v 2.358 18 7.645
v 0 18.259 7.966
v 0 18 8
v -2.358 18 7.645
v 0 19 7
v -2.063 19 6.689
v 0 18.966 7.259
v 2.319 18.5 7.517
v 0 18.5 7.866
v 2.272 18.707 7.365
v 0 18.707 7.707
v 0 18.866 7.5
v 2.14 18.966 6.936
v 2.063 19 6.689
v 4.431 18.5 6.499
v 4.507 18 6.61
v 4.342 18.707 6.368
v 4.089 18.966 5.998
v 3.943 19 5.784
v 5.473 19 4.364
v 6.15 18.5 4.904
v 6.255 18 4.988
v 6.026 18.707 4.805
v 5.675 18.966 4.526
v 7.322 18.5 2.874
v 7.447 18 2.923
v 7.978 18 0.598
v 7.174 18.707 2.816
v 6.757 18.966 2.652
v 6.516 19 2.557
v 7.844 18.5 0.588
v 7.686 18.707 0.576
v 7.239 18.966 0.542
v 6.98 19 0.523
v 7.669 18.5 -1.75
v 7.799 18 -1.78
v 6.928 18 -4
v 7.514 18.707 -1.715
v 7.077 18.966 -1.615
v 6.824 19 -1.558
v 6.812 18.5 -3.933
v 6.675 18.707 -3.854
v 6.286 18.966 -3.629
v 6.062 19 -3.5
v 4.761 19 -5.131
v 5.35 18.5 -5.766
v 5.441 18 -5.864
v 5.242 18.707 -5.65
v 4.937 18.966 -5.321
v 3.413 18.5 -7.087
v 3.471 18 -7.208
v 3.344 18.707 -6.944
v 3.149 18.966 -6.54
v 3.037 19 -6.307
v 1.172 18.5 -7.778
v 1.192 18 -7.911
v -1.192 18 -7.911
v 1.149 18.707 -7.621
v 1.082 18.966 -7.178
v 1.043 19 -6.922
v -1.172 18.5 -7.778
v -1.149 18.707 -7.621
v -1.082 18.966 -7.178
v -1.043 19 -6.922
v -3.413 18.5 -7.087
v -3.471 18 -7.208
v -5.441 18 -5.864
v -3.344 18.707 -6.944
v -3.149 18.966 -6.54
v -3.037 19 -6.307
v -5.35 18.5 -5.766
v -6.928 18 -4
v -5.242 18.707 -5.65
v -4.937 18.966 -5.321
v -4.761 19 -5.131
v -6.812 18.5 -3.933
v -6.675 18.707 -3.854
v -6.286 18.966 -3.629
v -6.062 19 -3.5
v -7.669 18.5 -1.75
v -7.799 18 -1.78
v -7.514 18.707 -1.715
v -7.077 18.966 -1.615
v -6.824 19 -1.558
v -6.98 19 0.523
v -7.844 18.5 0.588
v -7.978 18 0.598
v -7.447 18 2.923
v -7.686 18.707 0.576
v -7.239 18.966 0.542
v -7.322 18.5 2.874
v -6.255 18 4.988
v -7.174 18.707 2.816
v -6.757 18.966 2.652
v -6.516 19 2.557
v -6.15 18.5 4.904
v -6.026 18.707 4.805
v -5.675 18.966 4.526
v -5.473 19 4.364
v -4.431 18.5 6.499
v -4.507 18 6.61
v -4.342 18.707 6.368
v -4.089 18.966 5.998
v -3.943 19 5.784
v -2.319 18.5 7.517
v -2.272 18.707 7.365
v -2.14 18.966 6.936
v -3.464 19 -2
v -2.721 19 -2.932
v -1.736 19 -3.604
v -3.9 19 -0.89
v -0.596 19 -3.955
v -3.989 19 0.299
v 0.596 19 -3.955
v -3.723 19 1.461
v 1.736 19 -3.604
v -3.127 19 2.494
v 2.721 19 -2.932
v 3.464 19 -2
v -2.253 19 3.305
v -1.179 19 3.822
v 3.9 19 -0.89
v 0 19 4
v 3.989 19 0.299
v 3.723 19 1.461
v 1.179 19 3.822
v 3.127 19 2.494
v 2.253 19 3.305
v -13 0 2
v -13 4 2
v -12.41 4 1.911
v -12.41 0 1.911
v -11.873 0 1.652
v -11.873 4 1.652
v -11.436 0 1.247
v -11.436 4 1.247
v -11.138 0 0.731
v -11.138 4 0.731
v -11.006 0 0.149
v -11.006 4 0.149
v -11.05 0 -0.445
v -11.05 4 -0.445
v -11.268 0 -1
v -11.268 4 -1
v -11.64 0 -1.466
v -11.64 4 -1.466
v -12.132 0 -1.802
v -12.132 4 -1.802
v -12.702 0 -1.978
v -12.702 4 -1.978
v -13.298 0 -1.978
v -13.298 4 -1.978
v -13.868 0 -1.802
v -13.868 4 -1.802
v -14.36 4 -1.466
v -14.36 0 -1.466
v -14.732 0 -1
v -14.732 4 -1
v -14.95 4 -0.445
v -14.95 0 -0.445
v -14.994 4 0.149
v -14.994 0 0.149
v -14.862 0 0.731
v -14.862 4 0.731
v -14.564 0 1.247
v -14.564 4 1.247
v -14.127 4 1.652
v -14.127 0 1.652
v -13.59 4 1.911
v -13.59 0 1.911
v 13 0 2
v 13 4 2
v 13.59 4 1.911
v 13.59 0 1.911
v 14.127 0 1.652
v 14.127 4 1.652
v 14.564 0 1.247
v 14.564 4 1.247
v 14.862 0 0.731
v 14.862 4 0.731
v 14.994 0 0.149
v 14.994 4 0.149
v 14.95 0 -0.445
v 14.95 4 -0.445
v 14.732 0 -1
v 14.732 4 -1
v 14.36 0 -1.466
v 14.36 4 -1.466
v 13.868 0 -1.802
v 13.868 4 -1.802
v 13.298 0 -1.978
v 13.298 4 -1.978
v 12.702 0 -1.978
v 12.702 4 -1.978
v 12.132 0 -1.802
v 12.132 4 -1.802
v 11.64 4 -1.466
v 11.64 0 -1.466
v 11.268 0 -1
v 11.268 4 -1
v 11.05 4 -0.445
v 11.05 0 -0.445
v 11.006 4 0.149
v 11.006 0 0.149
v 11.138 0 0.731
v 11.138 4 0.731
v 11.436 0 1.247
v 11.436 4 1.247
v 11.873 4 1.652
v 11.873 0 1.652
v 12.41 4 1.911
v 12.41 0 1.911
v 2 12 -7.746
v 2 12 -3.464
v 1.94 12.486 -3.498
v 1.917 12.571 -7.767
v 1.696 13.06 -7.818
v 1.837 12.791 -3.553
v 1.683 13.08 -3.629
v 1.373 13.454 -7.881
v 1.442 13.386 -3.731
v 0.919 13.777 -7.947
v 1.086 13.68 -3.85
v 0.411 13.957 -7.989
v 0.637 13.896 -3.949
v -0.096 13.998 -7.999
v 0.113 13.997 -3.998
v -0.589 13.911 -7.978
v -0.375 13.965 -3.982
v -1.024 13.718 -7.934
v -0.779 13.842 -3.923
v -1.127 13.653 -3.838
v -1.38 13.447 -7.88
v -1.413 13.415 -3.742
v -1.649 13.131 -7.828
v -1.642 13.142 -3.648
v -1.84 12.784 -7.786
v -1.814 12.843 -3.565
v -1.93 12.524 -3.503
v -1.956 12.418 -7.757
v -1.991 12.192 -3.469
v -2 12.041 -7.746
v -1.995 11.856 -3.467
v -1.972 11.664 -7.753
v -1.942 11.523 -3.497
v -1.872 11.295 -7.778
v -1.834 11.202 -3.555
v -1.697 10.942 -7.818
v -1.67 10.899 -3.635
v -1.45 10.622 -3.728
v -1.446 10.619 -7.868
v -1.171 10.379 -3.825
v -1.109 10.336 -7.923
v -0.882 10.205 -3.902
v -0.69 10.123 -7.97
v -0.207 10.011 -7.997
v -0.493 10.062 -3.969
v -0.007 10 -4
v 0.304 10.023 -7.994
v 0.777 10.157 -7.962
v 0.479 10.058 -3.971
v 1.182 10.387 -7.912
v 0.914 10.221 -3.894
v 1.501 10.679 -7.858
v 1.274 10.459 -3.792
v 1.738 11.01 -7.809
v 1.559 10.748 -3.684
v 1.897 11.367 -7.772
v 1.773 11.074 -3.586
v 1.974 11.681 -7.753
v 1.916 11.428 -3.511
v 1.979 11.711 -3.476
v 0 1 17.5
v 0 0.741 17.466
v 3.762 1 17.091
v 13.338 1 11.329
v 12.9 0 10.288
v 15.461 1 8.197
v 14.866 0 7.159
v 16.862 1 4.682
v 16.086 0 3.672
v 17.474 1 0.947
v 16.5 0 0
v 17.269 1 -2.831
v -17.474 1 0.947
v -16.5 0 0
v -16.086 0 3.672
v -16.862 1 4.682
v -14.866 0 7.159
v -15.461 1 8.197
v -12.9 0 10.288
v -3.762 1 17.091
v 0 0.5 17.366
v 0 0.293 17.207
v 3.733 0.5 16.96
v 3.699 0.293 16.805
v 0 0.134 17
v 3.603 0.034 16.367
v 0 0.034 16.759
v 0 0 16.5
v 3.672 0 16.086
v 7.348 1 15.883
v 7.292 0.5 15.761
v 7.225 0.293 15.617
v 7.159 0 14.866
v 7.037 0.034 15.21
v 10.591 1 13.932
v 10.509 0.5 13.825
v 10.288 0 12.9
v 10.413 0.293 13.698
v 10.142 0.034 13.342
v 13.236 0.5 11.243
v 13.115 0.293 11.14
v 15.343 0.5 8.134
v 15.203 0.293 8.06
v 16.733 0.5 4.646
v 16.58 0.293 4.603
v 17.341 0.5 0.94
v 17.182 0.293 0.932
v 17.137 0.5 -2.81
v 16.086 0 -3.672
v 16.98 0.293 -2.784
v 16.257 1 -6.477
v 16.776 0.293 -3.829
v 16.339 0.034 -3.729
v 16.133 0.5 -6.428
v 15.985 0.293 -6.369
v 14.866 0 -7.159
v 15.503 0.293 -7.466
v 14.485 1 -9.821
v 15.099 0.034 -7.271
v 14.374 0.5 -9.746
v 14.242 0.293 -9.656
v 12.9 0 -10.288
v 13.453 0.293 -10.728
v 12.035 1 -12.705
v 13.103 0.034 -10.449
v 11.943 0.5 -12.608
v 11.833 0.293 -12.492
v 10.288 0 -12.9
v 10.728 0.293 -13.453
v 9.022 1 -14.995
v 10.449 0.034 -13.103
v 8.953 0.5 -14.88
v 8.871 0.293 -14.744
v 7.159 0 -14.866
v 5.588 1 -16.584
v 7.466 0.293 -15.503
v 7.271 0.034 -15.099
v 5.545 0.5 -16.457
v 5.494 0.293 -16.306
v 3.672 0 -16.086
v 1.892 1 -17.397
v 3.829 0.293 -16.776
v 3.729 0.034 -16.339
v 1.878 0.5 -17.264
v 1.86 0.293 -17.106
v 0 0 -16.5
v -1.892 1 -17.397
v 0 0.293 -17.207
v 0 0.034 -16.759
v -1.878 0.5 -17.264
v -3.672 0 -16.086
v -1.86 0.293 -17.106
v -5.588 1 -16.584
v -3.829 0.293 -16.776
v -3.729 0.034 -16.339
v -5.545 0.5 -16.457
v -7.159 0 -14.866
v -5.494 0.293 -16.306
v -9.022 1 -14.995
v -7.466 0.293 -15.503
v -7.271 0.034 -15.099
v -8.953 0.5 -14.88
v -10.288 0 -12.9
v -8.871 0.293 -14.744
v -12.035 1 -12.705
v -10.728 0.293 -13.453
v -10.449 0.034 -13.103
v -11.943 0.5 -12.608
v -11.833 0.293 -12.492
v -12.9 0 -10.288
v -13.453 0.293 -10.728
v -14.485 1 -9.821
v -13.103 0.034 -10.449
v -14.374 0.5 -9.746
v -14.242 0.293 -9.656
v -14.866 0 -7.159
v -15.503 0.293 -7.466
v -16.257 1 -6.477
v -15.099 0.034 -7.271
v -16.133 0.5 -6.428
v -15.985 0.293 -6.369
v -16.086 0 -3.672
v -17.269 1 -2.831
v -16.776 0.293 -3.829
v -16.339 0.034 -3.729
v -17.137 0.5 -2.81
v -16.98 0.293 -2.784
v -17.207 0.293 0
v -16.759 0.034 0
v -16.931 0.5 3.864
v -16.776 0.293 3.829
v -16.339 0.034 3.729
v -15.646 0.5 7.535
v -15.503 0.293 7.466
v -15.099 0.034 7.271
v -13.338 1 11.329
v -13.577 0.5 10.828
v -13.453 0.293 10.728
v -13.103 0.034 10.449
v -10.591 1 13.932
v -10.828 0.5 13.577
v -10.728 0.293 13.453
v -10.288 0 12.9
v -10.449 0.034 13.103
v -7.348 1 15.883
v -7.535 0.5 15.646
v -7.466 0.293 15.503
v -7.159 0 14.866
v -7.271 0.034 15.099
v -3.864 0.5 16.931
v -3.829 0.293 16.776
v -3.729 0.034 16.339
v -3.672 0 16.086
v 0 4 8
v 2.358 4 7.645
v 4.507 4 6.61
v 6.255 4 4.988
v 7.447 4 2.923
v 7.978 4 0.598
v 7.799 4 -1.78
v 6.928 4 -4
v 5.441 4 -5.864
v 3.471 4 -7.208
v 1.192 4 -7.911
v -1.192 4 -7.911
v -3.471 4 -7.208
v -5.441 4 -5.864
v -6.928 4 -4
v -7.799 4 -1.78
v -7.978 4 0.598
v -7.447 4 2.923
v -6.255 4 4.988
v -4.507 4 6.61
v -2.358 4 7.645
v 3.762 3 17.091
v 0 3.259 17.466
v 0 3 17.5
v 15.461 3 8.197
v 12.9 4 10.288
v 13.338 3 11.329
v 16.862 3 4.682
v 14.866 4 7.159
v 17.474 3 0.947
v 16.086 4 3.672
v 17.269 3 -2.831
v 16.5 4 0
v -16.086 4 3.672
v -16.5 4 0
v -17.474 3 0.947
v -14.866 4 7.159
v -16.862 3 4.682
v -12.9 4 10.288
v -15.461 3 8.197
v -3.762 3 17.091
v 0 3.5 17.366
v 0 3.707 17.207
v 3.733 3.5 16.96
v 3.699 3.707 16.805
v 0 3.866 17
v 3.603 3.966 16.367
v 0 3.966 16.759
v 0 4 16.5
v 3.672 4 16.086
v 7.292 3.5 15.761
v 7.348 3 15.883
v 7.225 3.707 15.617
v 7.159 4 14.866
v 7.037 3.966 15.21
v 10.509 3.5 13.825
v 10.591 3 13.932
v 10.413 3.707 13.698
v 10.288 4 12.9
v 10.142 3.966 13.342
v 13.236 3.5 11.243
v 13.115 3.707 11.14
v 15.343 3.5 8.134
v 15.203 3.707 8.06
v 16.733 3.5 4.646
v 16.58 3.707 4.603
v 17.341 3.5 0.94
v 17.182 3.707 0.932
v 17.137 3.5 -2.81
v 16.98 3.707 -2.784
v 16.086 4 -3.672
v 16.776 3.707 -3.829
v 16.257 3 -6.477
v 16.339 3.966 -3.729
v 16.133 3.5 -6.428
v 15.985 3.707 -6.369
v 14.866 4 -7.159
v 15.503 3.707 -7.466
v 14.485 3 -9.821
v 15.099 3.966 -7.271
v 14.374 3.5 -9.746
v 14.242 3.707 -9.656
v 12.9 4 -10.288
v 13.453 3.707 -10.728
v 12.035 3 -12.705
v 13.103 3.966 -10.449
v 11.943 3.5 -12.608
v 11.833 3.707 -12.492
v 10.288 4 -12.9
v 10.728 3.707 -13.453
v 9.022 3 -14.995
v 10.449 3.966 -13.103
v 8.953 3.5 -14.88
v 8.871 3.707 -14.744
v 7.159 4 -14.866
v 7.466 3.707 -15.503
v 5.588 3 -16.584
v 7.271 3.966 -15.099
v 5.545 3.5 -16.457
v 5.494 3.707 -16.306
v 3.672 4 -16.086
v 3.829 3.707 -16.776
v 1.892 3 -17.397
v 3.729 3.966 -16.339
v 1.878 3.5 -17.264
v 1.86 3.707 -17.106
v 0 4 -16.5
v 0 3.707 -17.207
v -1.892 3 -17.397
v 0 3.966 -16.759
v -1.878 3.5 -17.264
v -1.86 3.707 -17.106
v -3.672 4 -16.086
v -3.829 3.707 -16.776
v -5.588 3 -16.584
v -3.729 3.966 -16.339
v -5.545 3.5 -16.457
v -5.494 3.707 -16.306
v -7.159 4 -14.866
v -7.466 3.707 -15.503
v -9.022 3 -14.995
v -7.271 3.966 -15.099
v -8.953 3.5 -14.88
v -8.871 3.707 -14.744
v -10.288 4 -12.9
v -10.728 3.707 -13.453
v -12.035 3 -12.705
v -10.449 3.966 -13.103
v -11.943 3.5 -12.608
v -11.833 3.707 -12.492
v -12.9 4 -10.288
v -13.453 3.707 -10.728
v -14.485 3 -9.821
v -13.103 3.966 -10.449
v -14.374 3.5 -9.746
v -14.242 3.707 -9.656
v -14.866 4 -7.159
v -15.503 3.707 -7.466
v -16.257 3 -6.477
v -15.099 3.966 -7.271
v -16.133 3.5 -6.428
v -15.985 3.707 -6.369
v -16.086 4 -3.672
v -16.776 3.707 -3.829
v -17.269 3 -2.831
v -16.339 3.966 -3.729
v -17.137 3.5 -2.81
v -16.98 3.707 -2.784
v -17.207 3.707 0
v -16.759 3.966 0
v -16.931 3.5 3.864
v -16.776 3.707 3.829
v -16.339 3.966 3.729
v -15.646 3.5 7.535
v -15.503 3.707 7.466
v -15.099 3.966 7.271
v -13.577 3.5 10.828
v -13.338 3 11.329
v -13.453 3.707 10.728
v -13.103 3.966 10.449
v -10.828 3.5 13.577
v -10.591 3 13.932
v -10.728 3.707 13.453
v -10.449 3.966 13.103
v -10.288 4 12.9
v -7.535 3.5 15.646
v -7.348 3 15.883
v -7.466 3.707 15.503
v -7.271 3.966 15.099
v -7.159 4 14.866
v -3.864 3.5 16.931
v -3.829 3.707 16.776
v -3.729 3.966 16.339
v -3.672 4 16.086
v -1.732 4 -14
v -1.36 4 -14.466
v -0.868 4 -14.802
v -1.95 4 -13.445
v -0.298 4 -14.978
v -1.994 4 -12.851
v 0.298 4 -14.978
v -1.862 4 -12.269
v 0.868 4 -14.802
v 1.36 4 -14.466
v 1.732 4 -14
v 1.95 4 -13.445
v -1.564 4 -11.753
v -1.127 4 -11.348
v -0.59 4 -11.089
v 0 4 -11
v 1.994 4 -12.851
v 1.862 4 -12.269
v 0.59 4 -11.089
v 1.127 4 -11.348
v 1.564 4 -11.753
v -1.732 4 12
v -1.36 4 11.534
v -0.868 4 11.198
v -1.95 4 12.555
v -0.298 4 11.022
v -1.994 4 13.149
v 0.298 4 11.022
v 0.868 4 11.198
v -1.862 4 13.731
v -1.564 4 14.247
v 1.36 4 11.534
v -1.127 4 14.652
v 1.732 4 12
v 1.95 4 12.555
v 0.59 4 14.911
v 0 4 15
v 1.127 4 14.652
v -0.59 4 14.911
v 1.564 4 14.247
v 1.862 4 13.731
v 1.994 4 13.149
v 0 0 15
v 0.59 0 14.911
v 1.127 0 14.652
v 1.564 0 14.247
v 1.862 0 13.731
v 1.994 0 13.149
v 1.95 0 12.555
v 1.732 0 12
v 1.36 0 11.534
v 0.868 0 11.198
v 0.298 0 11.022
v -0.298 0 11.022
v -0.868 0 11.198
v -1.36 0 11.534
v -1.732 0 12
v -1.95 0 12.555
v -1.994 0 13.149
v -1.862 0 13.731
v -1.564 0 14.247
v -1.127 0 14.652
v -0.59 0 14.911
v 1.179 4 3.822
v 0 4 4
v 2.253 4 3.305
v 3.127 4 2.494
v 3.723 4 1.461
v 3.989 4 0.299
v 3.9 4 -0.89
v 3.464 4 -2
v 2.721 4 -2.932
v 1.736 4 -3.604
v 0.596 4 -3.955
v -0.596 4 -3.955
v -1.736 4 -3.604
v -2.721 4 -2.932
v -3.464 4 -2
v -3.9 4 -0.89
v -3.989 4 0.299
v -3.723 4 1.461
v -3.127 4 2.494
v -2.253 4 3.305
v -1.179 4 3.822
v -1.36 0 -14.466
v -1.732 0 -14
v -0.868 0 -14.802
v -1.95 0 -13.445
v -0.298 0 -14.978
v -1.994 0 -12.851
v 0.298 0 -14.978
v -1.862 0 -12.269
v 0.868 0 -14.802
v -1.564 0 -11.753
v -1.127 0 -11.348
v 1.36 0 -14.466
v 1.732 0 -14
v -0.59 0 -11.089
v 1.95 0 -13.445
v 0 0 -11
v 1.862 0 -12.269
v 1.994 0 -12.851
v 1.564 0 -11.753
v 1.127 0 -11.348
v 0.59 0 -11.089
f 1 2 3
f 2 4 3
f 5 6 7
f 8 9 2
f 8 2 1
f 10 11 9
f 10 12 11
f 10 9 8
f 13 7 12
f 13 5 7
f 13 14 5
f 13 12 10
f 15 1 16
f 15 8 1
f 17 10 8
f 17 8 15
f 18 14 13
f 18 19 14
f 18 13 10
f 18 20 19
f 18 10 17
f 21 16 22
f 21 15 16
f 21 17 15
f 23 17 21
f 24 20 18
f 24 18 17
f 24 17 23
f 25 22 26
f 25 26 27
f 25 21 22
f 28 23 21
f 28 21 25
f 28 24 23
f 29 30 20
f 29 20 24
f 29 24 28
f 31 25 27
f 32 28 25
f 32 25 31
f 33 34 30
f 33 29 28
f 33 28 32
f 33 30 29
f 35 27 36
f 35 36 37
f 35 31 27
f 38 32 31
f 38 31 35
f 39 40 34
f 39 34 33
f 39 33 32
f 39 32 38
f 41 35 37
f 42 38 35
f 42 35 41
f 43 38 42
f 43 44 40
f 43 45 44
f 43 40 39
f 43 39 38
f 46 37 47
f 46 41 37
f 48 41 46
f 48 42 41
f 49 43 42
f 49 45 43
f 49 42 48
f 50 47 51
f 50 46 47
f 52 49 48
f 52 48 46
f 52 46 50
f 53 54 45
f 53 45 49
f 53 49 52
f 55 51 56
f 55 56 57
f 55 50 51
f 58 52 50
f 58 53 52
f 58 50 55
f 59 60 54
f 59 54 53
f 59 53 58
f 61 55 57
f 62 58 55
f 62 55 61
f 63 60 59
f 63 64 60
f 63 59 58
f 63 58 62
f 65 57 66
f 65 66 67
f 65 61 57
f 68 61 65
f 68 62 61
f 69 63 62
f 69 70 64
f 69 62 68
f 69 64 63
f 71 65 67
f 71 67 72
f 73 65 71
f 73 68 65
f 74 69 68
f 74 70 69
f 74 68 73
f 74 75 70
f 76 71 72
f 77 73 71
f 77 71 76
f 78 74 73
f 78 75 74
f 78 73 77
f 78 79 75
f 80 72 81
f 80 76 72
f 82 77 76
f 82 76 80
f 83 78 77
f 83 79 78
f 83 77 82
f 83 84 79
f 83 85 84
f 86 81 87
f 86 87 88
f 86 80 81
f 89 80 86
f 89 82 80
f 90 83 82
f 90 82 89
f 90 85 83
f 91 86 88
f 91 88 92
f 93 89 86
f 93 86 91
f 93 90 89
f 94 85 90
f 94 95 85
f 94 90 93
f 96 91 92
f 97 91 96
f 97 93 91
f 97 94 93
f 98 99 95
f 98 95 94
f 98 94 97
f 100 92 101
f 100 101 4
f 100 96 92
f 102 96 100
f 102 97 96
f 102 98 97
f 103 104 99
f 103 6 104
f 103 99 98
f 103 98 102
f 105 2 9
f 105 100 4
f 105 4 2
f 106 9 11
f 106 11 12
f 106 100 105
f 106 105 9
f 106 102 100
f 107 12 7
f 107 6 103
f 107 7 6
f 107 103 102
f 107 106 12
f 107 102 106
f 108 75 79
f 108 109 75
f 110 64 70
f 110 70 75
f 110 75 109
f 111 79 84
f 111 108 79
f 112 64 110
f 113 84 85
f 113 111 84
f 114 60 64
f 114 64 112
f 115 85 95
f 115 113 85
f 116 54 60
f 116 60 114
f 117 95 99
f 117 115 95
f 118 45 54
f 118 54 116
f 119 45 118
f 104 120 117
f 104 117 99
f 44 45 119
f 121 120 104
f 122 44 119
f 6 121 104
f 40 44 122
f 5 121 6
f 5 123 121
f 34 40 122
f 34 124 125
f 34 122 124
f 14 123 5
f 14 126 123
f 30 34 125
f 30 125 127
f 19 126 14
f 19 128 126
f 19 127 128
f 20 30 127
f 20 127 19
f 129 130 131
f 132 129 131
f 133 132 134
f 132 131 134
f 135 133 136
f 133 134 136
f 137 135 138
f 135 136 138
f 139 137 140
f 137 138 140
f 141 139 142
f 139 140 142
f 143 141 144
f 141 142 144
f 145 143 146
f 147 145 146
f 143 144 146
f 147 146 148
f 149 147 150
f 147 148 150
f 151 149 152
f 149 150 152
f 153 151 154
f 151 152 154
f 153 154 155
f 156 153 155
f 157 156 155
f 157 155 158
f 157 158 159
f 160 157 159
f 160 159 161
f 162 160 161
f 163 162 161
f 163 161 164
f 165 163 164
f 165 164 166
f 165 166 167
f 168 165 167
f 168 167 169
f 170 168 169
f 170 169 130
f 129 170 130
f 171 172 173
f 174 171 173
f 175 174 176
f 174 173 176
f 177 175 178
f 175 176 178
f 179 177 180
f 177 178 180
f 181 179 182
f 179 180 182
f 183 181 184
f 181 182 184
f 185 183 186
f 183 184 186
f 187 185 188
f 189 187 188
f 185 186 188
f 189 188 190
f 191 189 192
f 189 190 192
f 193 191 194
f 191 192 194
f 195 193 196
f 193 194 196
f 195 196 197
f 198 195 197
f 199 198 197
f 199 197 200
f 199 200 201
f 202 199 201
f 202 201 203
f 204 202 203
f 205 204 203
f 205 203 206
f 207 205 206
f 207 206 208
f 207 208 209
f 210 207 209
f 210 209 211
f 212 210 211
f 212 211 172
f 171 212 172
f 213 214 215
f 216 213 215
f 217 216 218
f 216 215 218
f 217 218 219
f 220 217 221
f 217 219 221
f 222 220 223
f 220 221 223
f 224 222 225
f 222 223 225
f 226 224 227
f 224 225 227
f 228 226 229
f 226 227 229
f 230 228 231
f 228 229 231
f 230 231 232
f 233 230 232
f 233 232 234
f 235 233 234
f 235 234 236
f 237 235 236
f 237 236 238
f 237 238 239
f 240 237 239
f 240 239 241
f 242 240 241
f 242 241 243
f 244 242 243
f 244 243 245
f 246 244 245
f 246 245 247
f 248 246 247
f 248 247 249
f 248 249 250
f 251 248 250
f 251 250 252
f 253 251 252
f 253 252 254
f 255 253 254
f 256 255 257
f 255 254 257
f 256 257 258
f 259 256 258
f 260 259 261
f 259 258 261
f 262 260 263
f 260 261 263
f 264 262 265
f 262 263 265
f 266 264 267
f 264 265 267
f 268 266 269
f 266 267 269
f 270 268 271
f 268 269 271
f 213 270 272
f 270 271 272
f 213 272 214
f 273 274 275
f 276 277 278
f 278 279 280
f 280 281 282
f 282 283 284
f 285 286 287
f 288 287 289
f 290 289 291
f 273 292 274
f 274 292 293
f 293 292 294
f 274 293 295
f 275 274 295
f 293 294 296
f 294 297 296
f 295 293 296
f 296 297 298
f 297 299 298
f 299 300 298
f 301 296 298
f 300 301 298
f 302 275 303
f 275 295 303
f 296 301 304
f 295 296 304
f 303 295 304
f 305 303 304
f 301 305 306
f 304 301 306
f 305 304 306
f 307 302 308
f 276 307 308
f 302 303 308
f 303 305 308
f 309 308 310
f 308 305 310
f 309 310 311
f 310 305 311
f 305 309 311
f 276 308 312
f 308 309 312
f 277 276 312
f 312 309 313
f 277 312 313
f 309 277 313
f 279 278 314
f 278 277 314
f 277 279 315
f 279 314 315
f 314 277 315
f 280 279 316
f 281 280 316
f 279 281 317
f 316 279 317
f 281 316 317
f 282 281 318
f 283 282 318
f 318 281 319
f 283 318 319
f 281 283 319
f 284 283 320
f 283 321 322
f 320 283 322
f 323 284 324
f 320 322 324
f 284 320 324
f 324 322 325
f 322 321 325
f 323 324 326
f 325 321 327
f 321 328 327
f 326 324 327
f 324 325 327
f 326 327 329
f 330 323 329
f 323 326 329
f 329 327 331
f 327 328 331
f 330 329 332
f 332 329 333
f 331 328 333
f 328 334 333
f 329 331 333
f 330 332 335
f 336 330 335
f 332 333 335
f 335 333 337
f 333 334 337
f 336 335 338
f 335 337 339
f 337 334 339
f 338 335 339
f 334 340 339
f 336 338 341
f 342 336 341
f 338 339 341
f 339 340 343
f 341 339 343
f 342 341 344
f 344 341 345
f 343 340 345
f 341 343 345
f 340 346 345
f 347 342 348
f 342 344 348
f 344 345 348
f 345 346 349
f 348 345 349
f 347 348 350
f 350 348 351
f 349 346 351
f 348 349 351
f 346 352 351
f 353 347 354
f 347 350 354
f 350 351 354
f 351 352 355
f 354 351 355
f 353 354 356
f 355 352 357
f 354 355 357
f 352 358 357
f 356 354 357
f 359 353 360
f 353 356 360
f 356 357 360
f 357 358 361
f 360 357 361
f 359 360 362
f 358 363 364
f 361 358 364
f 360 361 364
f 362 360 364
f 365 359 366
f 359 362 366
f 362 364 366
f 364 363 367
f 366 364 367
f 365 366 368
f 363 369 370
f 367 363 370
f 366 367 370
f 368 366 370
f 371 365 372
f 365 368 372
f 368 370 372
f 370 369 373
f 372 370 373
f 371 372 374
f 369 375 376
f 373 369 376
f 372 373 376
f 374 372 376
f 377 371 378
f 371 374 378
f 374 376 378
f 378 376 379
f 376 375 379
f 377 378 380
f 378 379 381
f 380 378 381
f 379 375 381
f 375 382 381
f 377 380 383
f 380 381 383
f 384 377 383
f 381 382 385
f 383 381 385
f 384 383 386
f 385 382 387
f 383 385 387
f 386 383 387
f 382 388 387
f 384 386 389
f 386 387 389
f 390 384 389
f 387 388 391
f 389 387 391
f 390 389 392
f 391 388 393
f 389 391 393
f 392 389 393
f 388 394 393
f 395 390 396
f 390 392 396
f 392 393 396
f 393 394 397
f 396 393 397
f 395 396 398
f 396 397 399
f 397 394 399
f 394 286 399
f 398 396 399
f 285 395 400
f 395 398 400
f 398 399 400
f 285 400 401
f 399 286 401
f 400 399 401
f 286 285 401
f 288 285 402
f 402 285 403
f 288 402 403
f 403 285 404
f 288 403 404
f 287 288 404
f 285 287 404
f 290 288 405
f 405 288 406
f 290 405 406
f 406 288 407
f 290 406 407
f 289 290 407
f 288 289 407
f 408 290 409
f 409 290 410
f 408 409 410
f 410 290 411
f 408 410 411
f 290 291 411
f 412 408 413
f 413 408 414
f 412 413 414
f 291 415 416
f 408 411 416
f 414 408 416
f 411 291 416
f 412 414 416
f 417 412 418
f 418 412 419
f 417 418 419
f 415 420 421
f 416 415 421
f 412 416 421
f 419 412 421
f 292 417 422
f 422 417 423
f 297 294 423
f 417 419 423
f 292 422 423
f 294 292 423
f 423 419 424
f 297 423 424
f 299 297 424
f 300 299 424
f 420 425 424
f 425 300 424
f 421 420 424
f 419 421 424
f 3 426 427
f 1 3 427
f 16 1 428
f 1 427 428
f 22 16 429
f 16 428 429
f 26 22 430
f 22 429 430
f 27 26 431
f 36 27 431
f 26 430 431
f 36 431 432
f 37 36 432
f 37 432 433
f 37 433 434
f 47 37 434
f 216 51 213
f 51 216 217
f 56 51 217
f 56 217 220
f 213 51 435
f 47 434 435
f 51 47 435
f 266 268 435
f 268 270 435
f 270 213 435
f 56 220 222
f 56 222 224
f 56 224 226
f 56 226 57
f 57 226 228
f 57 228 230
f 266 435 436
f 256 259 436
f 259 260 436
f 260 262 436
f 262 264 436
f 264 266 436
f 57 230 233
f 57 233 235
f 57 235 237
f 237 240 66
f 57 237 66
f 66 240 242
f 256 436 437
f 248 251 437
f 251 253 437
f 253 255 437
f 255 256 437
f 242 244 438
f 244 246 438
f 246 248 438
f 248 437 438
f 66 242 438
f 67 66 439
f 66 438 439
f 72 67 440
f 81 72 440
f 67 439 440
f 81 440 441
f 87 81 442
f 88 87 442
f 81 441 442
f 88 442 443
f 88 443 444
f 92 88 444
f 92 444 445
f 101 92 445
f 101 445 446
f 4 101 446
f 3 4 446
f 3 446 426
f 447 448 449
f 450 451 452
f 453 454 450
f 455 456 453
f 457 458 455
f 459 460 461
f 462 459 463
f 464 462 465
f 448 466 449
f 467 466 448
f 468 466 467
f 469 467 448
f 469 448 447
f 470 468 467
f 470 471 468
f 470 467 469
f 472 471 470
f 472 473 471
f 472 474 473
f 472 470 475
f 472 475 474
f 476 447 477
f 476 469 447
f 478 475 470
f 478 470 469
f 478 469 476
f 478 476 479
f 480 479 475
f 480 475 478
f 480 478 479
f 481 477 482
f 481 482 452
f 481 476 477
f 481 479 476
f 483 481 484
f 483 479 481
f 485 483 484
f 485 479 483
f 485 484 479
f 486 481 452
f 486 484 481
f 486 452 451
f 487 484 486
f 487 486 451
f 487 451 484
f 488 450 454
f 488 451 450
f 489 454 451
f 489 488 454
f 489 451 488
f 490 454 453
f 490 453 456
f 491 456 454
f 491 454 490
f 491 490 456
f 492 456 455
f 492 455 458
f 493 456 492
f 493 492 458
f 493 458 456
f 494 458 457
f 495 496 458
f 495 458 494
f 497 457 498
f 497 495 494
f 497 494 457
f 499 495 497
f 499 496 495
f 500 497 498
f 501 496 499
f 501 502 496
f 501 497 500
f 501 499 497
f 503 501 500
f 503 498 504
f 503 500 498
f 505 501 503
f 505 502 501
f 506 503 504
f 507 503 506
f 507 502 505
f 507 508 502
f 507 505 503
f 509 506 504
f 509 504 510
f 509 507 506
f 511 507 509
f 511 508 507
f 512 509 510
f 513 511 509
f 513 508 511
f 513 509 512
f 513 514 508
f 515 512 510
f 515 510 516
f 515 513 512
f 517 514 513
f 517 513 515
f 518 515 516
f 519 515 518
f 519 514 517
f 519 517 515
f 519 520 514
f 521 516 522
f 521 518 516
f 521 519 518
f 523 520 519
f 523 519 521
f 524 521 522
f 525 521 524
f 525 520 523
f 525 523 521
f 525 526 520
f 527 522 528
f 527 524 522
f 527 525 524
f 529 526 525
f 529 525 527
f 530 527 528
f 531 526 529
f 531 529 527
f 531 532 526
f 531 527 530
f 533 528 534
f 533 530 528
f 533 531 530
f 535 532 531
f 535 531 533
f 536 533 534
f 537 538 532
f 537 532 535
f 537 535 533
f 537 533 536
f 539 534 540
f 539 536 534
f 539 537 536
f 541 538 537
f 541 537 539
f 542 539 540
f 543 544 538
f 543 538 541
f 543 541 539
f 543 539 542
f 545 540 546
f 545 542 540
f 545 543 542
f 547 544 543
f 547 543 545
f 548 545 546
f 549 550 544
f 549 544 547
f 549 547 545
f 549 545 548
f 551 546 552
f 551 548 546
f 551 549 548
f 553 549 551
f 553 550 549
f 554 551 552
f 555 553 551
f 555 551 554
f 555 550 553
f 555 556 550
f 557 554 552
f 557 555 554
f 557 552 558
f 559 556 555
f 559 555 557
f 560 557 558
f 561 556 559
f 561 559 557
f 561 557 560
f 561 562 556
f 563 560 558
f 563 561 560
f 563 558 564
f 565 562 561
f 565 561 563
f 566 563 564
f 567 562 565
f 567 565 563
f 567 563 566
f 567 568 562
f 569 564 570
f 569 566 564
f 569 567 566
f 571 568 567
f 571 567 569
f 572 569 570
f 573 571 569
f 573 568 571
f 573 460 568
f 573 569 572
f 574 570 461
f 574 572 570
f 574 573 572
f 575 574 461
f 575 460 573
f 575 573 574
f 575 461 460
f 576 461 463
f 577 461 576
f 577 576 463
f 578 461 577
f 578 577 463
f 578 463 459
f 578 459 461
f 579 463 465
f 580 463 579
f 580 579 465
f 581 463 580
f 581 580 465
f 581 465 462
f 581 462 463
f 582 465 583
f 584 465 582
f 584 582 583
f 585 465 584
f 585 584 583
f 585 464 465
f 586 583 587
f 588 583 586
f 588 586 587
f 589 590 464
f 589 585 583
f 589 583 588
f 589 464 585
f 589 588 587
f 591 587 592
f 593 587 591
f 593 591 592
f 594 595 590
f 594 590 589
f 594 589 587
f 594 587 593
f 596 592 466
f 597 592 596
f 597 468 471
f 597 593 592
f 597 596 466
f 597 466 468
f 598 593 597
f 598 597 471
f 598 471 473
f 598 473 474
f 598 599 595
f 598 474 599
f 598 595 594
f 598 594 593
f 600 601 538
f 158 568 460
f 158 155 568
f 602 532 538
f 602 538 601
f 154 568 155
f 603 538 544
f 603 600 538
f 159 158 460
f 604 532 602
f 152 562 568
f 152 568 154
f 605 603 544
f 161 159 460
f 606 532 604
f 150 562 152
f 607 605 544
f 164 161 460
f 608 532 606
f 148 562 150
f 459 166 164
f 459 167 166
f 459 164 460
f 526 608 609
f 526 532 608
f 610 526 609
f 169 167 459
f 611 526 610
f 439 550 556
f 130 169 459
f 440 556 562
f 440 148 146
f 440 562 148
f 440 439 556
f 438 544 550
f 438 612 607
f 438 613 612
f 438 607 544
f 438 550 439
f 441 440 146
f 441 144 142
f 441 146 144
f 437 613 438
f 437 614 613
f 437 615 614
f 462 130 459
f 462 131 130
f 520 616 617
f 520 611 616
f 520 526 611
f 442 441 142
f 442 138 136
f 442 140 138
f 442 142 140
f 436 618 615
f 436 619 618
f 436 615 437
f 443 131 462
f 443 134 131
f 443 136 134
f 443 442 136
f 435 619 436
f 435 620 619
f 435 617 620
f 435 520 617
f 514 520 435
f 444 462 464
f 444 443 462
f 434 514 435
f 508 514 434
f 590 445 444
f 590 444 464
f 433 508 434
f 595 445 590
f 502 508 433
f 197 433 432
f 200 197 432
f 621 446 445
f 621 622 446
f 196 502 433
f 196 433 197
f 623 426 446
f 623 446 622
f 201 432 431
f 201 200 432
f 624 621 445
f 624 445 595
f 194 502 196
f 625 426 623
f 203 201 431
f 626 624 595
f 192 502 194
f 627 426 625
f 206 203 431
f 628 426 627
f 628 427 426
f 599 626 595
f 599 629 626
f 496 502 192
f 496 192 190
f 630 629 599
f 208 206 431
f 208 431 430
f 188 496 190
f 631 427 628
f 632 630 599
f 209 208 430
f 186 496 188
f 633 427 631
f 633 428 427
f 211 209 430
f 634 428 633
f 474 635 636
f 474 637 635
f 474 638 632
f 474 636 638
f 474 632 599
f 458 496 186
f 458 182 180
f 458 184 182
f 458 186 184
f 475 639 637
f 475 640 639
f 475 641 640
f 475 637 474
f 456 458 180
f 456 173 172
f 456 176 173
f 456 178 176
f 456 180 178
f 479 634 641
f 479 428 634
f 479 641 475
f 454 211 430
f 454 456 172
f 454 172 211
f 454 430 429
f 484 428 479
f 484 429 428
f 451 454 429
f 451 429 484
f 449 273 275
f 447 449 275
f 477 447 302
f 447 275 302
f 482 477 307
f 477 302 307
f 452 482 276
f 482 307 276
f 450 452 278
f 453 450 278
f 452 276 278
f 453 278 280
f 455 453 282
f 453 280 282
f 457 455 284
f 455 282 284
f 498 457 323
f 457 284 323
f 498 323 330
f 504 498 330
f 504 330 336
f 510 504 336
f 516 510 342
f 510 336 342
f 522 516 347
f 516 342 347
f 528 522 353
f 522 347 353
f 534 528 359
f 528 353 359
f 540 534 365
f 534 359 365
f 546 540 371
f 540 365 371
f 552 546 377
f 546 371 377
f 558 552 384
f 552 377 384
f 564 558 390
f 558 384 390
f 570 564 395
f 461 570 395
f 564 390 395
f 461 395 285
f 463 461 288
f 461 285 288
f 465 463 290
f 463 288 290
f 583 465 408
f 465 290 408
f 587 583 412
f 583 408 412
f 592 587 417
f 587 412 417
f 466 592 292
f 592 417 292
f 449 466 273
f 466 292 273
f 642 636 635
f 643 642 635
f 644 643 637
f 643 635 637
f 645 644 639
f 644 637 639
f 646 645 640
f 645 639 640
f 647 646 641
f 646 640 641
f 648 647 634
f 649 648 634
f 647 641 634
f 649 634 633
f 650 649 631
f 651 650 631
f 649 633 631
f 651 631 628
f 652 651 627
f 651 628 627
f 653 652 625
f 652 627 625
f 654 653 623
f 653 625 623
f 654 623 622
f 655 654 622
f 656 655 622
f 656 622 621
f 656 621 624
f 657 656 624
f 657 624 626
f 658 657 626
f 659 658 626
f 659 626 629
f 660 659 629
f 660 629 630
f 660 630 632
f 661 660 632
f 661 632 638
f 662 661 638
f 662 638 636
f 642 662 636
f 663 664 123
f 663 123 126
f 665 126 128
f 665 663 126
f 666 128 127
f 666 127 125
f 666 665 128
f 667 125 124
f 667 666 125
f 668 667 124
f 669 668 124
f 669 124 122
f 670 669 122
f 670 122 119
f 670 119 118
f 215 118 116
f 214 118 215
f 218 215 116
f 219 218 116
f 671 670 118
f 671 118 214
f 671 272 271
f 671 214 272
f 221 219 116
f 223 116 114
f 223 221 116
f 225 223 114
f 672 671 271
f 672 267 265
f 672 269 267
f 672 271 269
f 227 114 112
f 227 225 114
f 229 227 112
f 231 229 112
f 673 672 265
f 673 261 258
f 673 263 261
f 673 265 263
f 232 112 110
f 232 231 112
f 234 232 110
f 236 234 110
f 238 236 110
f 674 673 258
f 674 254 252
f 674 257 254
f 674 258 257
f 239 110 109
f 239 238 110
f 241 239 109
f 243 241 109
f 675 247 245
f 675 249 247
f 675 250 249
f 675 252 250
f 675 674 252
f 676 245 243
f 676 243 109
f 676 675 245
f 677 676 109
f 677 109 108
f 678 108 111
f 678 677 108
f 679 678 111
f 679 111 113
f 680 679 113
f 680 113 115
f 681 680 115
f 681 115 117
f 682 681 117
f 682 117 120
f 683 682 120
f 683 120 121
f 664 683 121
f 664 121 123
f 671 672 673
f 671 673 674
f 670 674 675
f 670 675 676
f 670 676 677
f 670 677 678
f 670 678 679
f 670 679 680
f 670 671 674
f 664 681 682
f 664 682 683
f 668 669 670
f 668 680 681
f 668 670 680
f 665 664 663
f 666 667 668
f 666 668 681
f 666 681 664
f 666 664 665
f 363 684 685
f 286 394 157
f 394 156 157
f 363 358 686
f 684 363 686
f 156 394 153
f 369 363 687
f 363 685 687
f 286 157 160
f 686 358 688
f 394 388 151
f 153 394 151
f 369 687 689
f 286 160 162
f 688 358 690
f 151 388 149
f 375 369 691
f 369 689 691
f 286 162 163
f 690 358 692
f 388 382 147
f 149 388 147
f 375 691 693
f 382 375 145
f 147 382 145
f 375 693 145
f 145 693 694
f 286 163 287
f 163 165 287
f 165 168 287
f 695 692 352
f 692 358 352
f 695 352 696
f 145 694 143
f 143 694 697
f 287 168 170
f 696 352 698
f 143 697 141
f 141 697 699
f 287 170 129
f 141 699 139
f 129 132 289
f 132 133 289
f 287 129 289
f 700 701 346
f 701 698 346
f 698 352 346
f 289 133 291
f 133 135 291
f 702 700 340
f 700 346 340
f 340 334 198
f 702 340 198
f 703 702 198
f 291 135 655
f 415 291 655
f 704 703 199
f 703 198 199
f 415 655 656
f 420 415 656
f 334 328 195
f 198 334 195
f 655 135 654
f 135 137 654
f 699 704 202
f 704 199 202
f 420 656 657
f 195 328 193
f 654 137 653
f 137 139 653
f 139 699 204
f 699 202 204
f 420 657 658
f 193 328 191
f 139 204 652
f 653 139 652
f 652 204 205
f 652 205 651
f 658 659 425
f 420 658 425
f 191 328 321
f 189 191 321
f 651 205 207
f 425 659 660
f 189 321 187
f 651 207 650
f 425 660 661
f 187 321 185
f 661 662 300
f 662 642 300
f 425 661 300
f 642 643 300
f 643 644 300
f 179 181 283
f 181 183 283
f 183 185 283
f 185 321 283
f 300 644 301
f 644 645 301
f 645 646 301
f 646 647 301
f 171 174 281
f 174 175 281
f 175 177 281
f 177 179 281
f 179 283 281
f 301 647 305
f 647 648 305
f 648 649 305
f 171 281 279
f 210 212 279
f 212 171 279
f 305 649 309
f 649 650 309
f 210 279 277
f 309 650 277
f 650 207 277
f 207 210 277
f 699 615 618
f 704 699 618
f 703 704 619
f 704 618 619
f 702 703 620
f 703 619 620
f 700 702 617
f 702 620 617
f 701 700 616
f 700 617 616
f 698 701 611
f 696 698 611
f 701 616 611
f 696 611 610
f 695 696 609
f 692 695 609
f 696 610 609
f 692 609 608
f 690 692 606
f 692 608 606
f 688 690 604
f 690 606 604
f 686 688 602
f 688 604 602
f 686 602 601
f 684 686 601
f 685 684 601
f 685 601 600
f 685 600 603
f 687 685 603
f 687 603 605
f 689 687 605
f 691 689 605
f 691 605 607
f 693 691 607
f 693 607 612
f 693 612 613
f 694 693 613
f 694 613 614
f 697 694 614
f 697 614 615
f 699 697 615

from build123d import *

# Parameters (mm, degrees)
SKETCH_1_R               = 17.5
EXTRUDE_1_DEPTH          = 4
SKETCH_2_R               = 8
SKETCH_2_R_2             = 4
EXTRUDE_2_DEPTH          = 15
CUT_EXTRUDE_1_REACH      = 33.201
CUT_EXTRUDE_1_END_RADIUS = 8
SKETCH_3_R               = 2
FILLET_1_R               = 1
SKETCH_4_R               = 2
CUT_EXTRUDE_2_DEPTH      = 15


with BuildPart() as part:
    # 草图1 → 凸台-拉伸1 (new body)
    with BuildSketch(Plane(origin=(0, 0, 0), x_dir=(1, 0, 0), z_dir=(0, 1, 0))):
        with Locations(Location((0, 0, 0), (0, 0, 270))):
            Circle(SKETCH_1_R)
    extrude(amount=EXTRUDE_1_DEPTH)

    # 草图2 → 凸台-拉伸2 (add)
    with BuildSketch(Plane(origin=(0, 4, 0), x_dir=(1, 0, 0), z_dir=(0, 1, 0))):
        with Locations(Location((0, 0, 0), (0, 0, 270))):
            Circle(SKETCH_2_R)
        with Locations(Location((0, 0, 0), (0, 0, 270))):
            Circle(SKETCH_2_R_2, mode=Mode.SUBTRACT)
    extrude(amount=EXTRUDE_2_DEPTH)

    # 切除-拉伸1: up to this cylinder (the profile starts inside it)
    cut_extrude_1_end = Plane(origin=(0, 12, 0), z_dir=(0, -1, 0)) * Cylinder(CUT_EXTRUDE_1_END_RADIUS, 83.402, mode=Mode.PRIVATE)
    # 草图3 → 切除-拉伸1 (cut, up to the surface)
    with BuildSketch(Plane.XY, mode=Mode.PRIVATE) as cut_extrude_1_sk1:
        with Locations((0, 12)):
            Circle(SKETCH_3_R)
    cut_extrude_1_tool1 = extrude(cut_extrude_1_sk1.sketch, amount=-CUT_EXTRUDE_1_REACH, mode=Mode.PRIVATE) & cut_extrude_1_end
    add(cut_extrude_1_tool1.solids().sort_by_distance((0, 12, 0))[0], mode=Mode.SUBTRACT)

    # 圆角1
    fillet_1_edges = [part.edges().sort_by_distance(p)[0] for p in [
        (0, 0, -17.5),
        (0, 4, -17.5),
        (0, 19, -8),
    ]]
    fillet(fillet_1_edges, radius=FILLET_1_R)

    # 草图4 → 切除-拉伸2 (cut)
    with BuildSketch(Plane(origin=(0, 4, 0), x_dir=(1, 0, 0), z_dir=(0, 1, 0))):
        with Locations(Location((-13, 0, 0), (0, 0, 270))):
            Circle(SKETCH_4_R)
        with Locations(Location((0, -13, 0), (0, 0, 270))):
            Circle(SKETCH_4_R)
        with Locations(Location((0, 13, 0), (0, 0, 270))):
            Circle(SKETCH_4_R)
        with Locations(Location((13, 0, 0), (0, 0, 270))):
            Circle(SKETCH_4_R)
    extrude(amount=-CUT_EXTRUDE_2_DEPTH, mode=Mode.SUBTRACT)


solid = part.part
